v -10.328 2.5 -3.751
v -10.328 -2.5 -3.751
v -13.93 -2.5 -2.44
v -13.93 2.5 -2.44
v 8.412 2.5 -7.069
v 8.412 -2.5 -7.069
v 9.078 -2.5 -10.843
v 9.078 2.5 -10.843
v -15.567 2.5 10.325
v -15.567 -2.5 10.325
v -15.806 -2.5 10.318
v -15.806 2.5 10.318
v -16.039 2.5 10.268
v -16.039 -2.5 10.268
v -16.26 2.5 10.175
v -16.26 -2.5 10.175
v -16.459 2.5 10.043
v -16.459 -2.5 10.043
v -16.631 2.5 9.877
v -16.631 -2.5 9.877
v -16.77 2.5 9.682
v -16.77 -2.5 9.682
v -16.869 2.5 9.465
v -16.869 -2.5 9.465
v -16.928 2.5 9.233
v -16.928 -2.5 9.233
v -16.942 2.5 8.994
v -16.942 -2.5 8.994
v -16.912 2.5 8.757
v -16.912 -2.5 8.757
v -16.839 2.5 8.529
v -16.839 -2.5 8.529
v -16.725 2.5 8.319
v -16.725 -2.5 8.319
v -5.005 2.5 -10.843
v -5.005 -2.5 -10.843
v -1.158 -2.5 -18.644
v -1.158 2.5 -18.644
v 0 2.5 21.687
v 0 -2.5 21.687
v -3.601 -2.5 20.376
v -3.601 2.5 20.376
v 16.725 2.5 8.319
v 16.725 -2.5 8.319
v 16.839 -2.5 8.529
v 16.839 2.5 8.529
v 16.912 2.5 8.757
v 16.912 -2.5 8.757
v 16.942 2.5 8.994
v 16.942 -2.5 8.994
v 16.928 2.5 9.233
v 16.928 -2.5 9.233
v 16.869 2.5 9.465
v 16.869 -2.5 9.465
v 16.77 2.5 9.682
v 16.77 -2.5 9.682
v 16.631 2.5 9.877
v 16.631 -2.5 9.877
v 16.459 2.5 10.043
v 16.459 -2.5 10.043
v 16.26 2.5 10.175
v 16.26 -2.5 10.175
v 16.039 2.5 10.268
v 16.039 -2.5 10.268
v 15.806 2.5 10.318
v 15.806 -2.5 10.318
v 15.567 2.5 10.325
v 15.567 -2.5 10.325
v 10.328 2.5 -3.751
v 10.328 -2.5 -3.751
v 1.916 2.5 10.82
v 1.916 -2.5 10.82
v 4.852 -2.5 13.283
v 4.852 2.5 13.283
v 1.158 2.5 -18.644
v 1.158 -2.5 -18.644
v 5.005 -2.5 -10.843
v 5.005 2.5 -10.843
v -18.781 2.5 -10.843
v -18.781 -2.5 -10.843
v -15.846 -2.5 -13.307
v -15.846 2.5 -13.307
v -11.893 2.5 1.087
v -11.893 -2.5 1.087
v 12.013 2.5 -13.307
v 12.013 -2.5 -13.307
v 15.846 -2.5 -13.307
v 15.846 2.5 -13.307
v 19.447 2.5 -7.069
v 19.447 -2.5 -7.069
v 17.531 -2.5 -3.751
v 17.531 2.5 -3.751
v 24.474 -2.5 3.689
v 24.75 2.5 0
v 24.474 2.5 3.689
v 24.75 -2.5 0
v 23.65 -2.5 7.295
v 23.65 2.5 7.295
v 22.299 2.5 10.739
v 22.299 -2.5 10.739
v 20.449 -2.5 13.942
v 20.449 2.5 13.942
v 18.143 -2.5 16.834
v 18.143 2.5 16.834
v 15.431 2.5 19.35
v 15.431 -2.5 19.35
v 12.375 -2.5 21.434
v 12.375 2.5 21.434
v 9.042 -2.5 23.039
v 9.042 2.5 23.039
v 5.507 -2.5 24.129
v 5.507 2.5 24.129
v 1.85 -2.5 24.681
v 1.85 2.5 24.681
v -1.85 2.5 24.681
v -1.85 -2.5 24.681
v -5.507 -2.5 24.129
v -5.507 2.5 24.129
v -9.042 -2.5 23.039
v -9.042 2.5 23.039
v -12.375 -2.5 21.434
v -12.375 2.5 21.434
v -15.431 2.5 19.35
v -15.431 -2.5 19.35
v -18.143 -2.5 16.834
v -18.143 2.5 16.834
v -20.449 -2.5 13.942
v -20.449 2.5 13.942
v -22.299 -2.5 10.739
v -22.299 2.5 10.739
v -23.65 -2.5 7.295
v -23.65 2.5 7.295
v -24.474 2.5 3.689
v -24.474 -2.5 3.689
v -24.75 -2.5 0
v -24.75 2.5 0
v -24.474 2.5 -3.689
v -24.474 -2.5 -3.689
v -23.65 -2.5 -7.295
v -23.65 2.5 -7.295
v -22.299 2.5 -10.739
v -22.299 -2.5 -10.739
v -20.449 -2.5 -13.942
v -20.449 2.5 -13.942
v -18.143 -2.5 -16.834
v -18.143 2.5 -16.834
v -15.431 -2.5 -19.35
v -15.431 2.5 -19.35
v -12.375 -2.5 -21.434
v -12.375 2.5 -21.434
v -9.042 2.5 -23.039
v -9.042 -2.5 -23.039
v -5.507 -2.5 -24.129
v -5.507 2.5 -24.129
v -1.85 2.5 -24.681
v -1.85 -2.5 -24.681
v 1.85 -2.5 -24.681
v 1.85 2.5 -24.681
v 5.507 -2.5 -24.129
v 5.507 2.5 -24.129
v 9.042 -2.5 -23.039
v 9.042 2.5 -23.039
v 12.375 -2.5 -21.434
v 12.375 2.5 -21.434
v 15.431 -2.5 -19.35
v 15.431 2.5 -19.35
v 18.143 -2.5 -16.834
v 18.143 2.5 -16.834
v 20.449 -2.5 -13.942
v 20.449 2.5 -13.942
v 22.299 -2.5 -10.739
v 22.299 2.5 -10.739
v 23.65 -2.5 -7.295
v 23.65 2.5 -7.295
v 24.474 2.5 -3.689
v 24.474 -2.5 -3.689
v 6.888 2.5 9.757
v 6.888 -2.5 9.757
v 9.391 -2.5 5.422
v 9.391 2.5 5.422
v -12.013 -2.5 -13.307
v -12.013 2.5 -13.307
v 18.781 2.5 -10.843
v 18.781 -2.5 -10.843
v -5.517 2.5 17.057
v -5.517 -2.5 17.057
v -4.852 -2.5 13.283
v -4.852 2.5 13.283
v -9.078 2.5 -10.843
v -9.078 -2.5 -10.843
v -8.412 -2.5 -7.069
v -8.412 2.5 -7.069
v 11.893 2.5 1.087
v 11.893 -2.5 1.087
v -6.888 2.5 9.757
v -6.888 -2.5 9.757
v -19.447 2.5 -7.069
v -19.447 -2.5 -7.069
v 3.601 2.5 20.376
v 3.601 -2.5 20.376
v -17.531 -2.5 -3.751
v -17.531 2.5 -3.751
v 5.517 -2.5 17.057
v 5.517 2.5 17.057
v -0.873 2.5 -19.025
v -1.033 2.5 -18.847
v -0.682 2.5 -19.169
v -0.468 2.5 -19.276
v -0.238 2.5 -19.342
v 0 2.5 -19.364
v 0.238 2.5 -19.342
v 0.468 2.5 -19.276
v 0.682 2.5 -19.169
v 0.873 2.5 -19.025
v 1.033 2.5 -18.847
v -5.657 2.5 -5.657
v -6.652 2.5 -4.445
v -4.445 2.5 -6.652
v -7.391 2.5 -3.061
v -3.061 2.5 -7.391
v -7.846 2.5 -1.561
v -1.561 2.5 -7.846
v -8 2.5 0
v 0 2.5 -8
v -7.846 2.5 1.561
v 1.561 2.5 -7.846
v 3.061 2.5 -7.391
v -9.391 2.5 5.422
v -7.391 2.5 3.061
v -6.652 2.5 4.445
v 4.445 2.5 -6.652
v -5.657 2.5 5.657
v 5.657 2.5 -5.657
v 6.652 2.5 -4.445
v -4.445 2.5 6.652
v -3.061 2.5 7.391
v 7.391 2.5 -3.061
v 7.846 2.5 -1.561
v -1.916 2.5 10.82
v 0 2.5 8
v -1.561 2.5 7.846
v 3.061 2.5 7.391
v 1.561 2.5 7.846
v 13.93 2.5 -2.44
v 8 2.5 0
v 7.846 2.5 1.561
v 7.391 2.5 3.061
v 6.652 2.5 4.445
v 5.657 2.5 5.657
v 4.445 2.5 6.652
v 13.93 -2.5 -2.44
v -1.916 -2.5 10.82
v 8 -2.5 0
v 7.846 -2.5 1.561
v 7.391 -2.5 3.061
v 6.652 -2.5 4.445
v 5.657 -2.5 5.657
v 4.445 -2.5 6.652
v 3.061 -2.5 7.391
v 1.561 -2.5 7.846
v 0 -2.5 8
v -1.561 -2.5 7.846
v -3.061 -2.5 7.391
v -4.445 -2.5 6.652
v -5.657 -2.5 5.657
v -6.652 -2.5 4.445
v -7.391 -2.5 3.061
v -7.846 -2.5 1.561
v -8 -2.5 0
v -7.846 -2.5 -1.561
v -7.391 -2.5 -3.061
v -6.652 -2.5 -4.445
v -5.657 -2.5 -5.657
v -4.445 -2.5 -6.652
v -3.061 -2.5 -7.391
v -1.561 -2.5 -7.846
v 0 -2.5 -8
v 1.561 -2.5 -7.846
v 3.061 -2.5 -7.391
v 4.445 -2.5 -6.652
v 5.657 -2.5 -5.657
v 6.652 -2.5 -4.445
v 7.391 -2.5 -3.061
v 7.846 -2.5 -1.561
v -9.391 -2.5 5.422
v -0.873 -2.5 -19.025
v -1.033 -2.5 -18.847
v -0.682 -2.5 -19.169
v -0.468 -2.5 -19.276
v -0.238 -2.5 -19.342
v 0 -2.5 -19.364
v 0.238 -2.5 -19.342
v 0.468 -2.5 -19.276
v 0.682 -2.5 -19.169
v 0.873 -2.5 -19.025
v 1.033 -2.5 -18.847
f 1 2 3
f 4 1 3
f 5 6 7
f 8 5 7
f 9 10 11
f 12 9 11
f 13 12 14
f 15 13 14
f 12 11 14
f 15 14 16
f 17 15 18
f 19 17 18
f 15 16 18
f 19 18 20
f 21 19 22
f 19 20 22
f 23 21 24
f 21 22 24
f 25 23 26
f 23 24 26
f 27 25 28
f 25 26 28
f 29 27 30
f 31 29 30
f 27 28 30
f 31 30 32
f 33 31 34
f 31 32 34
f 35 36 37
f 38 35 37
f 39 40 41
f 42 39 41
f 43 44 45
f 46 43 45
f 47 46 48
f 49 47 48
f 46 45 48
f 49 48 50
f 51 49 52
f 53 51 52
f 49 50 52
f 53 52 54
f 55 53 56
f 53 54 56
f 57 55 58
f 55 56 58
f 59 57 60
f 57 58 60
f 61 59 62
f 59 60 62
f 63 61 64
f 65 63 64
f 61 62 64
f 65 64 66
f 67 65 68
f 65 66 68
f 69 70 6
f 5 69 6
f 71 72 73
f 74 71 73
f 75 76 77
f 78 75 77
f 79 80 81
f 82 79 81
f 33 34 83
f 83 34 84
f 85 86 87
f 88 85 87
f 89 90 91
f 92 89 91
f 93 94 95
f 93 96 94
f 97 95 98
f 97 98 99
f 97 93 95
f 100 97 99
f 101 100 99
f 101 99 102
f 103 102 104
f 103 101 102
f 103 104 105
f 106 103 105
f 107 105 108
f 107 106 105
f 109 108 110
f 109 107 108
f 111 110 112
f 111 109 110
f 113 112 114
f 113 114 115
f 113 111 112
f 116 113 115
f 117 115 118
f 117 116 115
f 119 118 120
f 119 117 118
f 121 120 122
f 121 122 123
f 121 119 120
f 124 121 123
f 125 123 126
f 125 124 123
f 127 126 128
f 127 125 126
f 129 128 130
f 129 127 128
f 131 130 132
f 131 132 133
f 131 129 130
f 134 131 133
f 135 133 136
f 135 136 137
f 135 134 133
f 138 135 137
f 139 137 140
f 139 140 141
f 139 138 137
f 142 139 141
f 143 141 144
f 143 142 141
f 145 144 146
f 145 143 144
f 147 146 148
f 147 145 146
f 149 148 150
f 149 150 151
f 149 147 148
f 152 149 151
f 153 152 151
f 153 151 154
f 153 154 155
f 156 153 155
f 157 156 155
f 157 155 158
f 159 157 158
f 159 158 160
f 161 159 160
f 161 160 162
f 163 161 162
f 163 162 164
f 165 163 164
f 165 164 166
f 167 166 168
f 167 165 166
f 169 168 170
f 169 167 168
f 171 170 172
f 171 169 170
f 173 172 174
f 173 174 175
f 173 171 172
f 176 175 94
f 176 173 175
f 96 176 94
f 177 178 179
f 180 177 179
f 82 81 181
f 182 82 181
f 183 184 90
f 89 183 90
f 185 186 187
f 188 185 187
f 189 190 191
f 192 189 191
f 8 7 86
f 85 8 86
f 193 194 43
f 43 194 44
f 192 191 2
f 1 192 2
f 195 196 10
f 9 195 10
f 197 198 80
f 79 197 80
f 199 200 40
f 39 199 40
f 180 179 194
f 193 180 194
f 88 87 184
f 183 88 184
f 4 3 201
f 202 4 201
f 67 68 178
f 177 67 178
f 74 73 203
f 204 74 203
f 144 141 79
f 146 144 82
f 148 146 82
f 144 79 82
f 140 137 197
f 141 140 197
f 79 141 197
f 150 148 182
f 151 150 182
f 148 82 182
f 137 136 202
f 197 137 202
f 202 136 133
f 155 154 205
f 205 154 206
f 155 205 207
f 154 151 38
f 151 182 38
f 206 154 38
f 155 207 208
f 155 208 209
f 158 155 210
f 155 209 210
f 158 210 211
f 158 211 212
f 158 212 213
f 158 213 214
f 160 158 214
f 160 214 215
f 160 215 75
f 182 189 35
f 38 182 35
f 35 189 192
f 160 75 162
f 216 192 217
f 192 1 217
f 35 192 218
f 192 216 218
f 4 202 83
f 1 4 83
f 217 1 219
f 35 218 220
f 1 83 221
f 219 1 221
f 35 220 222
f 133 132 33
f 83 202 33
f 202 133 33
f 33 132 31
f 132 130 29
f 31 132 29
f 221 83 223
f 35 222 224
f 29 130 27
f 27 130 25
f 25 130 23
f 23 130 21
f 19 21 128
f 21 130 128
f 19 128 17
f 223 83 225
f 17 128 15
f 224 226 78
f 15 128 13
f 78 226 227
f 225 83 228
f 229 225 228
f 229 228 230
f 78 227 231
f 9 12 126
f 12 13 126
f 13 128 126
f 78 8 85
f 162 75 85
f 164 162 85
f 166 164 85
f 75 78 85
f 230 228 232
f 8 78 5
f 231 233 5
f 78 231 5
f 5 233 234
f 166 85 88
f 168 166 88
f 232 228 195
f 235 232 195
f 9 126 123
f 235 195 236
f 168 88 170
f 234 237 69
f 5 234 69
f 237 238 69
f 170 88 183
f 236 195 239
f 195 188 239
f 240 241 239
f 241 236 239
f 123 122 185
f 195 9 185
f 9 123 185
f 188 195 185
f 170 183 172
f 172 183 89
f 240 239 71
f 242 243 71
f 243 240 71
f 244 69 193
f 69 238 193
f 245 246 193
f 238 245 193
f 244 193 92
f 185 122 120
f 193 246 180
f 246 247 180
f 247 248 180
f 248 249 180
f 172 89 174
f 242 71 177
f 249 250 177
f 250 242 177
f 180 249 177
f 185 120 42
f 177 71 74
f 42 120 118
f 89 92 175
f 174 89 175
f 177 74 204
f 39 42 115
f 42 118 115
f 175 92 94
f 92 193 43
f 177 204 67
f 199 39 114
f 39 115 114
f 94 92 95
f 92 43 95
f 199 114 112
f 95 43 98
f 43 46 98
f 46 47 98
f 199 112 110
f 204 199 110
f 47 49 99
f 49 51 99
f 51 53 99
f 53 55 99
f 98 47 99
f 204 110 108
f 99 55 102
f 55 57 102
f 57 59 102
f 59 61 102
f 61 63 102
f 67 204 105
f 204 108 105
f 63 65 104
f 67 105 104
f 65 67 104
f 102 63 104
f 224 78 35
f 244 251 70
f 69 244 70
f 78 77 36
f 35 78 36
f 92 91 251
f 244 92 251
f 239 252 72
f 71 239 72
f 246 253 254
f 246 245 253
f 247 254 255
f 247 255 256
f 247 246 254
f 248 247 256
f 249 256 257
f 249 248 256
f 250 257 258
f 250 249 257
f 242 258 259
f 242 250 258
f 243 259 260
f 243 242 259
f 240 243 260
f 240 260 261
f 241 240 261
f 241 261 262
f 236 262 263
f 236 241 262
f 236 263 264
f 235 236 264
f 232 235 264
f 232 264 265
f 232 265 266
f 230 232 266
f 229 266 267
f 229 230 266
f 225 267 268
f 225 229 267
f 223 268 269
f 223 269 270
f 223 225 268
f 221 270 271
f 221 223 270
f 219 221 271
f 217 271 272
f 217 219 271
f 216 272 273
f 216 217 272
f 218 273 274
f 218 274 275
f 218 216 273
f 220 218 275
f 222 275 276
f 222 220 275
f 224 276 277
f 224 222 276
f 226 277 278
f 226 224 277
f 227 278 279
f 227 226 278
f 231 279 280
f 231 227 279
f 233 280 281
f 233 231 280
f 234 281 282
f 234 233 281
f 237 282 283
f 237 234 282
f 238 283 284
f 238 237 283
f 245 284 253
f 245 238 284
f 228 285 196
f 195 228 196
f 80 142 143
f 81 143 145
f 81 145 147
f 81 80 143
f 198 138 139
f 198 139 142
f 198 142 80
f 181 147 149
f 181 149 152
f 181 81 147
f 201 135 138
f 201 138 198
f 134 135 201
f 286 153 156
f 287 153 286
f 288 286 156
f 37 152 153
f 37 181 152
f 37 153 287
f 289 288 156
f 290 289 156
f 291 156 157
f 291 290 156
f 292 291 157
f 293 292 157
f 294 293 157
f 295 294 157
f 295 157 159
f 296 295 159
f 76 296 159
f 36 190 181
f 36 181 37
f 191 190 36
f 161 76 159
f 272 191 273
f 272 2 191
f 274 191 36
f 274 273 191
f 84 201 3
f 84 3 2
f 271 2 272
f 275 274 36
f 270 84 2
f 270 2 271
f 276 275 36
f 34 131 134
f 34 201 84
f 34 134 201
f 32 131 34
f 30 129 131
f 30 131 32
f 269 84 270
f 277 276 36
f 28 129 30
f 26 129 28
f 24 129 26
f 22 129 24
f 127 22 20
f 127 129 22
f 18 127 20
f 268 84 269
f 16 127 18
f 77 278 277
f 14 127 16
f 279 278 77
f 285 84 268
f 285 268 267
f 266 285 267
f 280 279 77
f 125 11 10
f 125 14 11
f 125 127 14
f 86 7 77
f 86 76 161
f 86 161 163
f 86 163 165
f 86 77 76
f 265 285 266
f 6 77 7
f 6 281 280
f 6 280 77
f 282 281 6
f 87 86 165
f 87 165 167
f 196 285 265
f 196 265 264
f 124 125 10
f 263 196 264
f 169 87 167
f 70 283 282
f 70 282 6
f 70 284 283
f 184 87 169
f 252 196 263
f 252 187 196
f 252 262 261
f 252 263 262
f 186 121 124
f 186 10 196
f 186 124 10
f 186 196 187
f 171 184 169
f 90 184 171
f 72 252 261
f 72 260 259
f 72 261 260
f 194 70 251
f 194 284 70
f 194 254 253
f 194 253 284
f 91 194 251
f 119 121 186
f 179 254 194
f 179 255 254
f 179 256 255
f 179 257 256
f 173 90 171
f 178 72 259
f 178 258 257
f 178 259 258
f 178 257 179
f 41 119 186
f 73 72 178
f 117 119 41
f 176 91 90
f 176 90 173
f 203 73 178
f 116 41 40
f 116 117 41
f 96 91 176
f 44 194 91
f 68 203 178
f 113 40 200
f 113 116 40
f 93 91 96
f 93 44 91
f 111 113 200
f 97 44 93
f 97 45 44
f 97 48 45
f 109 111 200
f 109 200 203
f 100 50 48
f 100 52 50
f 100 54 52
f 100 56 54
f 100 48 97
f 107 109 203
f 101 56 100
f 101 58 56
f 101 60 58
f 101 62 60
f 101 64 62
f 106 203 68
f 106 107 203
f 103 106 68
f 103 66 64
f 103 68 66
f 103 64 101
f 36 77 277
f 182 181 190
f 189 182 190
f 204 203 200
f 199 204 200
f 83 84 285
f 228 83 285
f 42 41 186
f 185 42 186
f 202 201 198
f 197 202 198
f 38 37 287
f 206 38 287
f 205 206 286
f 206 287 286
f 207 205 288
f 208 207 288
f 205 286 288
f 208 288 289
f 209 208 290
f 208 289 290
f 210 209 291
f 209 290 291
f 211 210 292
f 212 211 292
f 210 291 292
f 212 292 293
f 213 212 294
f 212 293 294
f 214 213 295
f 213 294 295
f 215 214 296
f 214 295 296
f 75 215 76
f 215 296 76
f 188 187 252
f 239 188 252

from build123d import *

# Parameters (mm, degrees)
F0_R     = 24.75
F0_R_2   = 8
F1_DEPTH = 2.5
F3_DEPTH = 5.001


with BuildPart() as f1:
    # F0 (on Front) → F1 (new body, symmetric)
    with BuildSketch(Plane.XZ):
        Circle(F0_R)
        Circle(F0_R_2, mode=Mode.SUBTRACT)
    extrude(amount=F1_DEPTH, both=True)

    # F2 (on face) → F3 (cut, through all)
    with BuildSketch(Plane.XZ.offset(2.5)):
        Polygon((-1.916116, 10.819963), (1.916116, 10.819963), (4.851777, 13.283275), (5.517237, 17.057287), (3.601121, 20.376098), (0, 21.686799), (-3.601121, 20.376098), (-5.517237, 17.057287), (-4.851777, 13.283275), align=None)
        Polygon((-19.446779, -7.069387), (-18.781318, -10.843399), (-15.845658, -13.306711), (-12.013425, -13.306711), (-9.077765, -10.843399), (-8.412305, -7.069387), (-10.328421, -3.750576), (-13.929542, -2.439876), (-17.530662, -3.750576), align=None)
        Polygon((15.845658, -13.306711), (18.781318, -10.843399), (19.446779, -7.069387), (17.530662, -3.750576), (13.929542, -2.439876), (10.328421, -3.750576), (8.412305, -7.069387), (9.077765, -10.843399), (12.013425, -13.306711), align=None)
        with BuildLine():
            ThreePointArc((-1.158459, -18.64352), (0, -19.363865), (1.158459, -18.64352))
            Line((1.158459, -18.64352), (5.005436, -10.843399))
            Line((5.005436, -10.843399), (0, -10.843399))
            Line((0, -10.843399), (-5.005436, -10.843399))
            Line((-5.005436, -10.843399), (-1.158459, -18.64352))
        make_face()
        with BuildLine():
            Line((9.390659, 5.4217), (11.893377, 1.086865))
            Line((11.893377, 1.086865), (16.724992, 8.318505))
            ThreePointArc((16.724992, 8.318505), (16.769599, 9.681932), (15.566532, 10.325015))
            Line((15.566532, 10.325015), (6.887941, 9.756534))
            Line((6.887941, 9.756534), (9.390659, 5.4217))
        make_face()
        with BuildLine():
            Line((-9.390659, 5.4217), (-6.887941, 9.756534))
            Line((-6.887941, 9.756534), (-15.566532, 10.325015))
            ThreePointArc((-15.566532, 10.325015), (-16.769599, 9.681932), (-16.724992, 8.318505))
            Line((-16.724992, 8.318505), (-11.893377, 1.086865))
            Line((-11.893377, 1.086865), (-9.390659, 5.4217))
        make_face()
    extrude(amount=-F3_DEPTH, mode=Mode.SUBTRACT)


solid = f1.part
